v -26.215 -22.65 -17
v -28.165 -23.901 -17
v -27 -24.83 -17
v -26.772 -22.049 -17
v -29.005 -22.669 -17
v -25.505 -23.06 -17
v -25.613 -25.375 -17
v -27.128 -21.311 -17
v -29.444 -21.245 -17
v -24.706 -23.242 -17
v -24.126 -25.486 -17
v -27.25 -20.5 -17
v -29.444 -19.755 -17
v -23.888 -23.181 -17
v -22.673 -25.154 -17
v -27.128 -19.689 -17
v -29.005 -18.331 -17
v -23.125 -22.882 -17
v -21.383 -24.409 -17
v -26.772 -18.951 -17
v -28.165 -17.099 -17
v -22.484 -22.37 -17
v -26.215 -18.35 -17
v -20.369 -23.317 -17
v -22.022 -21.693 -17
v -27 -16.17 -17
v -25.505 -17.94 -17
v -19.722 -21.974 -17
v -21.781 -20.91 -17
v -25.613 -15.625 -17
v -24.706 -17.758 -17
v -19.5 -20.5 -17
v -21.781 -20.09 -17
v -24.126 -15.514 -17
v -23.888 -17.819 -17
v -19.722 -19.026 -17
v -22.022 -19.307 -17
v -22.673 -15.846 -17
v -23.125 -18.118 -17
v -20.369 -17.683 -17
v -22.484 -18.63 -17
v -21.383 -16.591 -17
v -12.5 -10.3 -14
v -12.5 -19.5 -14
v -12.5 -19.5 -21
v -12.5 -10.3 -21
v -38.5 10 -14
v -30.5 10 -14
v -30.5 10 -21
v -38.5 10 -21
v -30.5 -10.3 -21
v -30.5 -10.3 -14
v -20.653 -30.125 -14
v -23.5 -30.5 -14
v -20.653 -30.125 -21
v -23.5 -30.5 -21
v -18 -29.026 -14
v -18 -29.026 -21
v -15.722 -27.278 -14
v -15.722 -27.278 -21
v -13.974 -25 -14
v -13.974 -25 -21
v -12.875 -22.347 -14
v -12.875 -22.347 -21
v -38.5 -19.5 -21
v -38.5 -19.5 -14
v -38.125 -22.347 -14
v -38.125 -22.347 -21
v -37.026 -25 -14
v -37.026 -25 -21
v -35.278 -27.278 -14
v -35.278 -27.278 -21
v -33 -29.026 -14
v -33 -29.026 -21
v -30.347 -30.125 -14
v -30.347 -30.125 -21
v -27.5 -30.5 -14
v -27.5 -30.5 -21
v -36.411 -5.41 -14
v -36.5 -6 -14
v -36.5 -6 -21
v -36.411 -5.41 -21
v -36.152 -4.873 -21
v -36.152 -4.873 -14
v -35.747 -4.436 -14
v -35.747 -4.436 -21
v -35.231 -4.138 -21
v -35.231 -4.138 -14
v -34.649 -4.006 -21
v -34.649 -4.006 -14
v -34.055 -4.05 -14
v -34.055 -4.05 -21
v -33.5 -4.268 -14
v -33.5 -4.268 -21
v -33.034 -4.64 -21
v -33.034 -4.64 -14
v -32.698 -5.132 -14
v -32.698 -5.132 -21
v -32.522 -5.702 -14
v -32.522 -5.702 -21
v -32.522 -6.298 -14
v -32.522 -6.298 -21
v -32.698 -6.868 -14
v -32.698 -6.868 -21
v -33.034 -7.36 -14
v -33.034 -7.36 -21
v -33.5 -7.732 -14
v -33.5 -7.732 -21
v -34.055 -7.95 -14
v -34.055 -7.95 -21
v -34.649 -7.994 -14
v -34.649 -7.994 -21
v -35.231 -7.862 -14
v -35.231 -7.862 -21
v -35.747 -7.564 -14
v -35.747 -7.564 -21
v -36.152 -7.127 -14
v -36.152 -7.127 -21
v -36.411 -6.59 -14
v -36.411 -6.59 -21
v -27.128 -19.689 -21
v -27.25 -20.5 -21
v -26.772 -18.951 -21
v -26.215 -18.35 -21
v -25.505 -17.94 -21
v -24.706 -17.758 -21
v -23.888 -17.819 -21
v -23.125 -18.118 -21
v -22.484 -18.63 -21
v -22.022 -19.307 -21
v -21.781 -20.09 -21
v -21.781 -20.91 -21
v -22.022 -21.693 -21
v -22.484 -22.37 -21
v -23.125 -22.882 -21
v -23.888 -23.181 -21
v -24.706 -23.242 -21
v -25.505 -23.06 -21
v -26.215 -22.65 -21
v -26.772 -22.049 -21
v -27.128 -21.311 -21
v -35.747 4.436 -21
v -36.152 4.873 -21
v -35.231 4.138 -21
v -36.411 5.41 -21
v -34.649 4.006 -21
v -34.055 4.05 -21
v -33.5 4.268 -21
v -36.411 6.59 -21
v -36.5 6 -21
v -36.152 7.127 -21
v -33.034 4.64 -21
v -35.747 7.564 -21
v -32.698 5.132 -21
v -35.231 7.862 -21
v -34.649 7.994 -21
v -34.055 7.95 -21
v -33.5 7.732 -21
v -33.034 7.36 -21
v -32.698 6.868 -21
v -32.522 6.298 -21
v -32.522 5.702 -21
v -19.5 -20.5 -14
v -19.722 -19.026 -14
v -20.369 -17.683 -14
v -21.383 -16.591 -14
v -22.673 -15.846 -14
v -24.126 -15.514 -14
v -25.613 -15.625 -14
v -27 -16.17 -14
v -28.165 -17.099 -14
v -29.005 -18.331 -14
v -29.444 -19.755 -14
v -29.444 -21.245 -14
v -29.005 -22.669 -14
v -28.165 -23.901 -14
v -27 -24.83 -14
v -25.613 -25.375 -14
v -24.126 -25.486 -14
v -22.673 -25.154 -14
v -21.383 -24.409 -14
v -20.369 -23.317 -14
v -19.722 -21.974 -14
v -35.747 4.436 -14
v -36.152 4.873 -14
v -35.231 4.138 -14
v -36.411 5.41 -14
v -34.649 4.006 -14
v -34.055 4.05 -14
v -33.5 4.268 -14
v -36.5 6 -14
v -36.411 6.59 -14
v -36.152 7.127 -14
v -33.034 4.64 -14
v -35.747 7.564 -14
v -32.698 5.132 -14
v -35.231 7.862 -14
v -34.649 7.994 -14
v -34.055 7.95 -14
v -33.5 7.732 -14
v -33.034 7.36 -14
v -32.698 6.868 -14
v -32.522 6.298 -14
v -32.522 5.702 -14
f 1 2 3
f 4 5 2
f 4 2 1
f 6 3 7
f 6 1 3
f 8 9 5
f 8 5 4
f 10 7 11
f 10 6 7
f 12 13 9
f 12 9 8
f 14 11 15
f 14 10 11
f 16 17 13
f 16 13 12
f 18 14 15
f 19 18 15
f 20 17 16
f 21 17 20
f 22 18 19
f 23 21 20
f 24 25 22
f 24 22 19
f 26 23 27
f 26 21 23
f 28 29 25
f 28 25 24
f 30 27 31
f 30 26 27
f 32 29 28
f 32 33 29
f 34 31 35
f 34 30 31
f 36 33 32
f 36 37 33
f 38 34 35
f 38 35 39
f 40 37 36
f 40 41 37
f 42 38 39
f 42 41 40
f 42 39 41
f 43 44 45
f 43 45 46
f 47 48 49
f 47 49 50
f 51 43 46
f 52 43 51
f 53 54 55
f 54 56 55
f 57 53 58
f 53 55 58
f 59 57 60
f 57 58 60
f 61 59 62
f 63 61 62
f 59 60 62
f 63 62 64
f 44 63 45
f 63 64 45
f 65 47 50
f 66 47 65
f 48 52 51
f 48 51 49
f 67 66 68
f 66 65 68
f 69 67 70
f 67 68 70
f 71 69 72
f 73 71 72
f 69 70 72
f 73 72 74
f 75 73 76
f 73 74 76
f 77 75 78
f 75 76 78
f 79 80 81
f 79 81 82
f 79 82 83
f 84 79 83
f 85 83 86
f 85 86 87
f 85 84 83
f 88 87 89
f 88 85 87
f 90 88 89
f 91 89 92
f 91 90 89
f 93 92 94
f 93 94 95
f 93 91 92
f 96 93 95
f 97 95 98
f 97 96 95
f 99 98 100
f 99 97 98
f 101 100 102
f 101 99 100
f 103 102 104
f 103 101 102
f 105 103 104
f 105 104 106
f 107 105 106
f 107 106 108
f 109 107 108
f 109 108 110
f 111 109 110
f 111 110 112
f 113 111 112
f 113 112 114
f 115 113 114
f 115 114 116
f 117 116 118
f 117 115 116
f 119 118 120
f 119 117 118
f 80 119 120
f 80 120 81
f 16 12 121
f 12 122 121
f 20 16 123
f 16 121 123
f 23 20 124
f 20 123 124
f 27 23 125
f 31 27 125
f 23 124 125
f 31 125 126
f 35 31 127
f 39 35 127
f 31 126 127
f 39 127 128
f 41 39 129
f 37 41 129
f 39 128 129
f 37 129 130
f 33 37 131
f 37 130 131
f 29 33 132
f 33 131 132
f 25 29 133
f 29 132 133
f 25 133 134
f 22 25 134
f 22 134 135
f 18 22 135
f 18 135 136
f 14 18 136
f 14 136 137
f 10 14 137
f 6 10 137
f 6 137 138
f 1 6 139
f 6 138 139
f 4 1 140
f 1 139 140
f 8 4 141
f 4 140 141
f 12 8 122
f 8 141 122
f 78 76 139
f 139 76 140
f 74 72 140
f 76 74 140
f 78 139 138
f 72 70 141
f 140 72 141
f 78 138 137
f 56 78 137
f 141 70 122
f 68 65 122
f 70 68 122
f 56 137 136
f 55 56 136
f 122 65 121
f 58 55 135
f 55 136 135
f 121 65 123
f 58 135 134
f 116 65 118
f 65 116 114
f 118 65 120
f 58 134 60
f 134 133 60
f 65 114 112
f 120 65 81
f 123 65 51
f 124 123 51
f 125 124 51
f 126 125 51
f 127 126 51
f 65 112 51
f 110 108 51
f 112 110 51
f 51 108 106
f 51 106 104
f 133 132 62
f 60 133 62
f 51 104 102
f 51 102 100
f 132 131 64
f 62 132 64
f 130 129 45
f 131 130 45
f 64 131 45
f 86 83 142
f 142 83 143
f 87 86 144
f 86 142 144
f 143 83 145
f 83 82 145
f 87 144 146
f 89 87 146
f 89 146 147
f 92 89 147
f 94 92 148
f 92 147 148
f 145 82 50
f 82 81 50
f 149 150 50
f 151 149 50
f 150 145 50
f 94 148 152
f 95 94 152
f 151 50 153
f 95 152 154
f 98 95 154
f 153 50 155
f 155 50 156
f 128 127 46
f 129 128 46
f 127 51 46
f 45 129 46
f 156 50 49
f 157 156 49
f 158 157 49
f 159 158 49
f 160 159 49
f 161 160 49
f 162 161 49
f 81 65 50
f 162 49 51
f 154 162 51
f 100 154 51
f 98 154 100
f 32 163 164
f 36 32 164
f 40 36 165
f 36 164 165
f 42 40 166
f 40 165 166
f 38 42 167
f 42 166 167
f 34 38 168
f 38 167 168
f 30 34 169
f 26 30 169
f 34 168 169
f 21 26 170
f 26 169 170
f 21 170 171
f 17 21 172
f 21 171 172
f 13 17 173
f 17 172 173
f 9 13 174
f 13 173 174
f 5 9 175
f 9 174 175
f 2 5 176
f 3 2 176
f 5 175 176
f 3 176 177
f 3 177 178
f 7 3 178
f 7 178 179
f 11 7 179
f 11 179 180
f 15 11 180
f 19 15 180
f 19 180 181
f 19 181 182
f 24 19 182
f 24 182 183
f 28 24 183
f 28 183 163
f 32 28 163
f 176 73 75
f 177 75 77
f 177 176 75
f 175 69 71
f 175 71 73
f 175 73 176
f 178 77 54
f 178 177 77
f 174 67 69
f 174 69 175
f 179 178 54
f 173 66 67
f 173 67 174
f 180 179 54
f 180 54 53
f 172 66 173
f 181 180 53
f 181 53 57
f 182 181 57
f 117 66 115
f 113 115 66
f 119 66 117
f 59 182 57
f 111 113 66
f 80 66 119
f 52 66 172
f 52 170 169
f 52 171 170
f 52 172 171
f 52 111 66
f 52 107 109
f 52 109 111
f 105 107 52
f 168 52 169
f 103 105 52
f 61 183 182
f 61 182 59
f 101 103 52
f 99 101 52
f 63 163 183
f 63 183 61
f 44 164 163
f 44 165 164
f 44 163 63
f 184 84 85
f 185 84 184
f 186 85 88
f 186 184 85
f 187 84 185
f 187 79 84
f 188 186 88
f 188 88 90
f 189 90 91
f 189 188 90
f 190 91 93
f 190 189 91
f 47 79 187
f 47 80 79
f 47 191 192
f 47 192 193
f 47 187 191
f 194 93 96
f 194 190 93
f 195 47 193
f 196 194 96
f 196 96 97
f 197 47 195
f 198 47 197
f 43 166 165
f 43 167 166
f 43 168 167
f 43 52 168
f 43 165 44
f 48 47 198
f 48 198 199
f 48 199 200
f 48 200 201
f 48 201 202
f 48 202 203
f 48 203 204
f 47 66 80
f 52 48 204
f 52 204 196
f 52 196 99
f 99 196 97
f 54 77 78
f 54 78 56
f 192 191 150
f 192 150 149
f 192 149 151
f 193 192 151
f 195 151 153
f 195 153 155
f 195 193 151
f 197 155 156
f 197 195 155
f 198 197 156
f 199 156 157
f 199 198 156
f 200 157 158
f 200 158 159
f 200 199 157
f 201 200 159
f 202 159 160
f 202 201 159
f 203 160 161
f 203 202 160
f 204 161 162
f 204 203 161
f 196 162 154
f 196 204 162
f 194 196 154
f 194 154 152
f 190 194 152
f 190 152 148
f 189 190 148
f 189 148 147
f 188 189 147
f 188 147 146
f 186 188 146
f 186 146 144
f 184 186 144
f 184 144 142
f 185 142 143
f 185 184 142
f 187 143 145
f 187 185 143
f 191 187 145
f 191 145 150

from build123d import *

# Parameters (mm, degrees)
SKETCH004_R      = 2
PAD001_DEPTH     = 7
HOLE_D           = 5.5
HOLE_DEPTH       = 25
HOLE_CBORE_D     = 10
HOLE_CBORE_DEPTH = 3
FILLET_R         = 11


with BuildPart() as part:
    # Sketch004 → Pad001 (new body)
    with BuildSketch(Plane(origin=(0, 0, 0), x_dir=(-1, 0, 0), z_dir=(0, 0, -1))):
        Polygon((29, 10), (29, -30.5), (3, -30.5), (3, -10.3), (21, -10.3), (21, 10), align=None)
        with Locations((25, 6)):
            Circle(SKETCH004_R, mode=Mode.SUBTRACT)
        with Locations((25, -6)):
            Circle(SKETCH004_R, mode=Mode.SUBTRACT)
    extrude(amount=PAD001_DEPTH)

    # Hole
    with Locations(Plane.XY):
        with Locations((-15, -20.5)):
            CounterBoreHole(HOLE_D / 2, HOLE_CBORE_D / 2, HOLE_CBORE_DEPTH, depth=HOLE_DEPTH)

    # Fillet
    fillet_edges = [part.edges().sort_by_distance(p)[0] for p in [
        (-29, -30.5, -3.5),
        (-3, -30.5, -3.5),
    ]]
    fillet(fillet_edges, radius=FILLET_R)


with BuildPart() as part_1:
    # Body002 placement: moved
    add(part.part.moved(Location((-9.5, 0, -14))))


solid = part_1.part
